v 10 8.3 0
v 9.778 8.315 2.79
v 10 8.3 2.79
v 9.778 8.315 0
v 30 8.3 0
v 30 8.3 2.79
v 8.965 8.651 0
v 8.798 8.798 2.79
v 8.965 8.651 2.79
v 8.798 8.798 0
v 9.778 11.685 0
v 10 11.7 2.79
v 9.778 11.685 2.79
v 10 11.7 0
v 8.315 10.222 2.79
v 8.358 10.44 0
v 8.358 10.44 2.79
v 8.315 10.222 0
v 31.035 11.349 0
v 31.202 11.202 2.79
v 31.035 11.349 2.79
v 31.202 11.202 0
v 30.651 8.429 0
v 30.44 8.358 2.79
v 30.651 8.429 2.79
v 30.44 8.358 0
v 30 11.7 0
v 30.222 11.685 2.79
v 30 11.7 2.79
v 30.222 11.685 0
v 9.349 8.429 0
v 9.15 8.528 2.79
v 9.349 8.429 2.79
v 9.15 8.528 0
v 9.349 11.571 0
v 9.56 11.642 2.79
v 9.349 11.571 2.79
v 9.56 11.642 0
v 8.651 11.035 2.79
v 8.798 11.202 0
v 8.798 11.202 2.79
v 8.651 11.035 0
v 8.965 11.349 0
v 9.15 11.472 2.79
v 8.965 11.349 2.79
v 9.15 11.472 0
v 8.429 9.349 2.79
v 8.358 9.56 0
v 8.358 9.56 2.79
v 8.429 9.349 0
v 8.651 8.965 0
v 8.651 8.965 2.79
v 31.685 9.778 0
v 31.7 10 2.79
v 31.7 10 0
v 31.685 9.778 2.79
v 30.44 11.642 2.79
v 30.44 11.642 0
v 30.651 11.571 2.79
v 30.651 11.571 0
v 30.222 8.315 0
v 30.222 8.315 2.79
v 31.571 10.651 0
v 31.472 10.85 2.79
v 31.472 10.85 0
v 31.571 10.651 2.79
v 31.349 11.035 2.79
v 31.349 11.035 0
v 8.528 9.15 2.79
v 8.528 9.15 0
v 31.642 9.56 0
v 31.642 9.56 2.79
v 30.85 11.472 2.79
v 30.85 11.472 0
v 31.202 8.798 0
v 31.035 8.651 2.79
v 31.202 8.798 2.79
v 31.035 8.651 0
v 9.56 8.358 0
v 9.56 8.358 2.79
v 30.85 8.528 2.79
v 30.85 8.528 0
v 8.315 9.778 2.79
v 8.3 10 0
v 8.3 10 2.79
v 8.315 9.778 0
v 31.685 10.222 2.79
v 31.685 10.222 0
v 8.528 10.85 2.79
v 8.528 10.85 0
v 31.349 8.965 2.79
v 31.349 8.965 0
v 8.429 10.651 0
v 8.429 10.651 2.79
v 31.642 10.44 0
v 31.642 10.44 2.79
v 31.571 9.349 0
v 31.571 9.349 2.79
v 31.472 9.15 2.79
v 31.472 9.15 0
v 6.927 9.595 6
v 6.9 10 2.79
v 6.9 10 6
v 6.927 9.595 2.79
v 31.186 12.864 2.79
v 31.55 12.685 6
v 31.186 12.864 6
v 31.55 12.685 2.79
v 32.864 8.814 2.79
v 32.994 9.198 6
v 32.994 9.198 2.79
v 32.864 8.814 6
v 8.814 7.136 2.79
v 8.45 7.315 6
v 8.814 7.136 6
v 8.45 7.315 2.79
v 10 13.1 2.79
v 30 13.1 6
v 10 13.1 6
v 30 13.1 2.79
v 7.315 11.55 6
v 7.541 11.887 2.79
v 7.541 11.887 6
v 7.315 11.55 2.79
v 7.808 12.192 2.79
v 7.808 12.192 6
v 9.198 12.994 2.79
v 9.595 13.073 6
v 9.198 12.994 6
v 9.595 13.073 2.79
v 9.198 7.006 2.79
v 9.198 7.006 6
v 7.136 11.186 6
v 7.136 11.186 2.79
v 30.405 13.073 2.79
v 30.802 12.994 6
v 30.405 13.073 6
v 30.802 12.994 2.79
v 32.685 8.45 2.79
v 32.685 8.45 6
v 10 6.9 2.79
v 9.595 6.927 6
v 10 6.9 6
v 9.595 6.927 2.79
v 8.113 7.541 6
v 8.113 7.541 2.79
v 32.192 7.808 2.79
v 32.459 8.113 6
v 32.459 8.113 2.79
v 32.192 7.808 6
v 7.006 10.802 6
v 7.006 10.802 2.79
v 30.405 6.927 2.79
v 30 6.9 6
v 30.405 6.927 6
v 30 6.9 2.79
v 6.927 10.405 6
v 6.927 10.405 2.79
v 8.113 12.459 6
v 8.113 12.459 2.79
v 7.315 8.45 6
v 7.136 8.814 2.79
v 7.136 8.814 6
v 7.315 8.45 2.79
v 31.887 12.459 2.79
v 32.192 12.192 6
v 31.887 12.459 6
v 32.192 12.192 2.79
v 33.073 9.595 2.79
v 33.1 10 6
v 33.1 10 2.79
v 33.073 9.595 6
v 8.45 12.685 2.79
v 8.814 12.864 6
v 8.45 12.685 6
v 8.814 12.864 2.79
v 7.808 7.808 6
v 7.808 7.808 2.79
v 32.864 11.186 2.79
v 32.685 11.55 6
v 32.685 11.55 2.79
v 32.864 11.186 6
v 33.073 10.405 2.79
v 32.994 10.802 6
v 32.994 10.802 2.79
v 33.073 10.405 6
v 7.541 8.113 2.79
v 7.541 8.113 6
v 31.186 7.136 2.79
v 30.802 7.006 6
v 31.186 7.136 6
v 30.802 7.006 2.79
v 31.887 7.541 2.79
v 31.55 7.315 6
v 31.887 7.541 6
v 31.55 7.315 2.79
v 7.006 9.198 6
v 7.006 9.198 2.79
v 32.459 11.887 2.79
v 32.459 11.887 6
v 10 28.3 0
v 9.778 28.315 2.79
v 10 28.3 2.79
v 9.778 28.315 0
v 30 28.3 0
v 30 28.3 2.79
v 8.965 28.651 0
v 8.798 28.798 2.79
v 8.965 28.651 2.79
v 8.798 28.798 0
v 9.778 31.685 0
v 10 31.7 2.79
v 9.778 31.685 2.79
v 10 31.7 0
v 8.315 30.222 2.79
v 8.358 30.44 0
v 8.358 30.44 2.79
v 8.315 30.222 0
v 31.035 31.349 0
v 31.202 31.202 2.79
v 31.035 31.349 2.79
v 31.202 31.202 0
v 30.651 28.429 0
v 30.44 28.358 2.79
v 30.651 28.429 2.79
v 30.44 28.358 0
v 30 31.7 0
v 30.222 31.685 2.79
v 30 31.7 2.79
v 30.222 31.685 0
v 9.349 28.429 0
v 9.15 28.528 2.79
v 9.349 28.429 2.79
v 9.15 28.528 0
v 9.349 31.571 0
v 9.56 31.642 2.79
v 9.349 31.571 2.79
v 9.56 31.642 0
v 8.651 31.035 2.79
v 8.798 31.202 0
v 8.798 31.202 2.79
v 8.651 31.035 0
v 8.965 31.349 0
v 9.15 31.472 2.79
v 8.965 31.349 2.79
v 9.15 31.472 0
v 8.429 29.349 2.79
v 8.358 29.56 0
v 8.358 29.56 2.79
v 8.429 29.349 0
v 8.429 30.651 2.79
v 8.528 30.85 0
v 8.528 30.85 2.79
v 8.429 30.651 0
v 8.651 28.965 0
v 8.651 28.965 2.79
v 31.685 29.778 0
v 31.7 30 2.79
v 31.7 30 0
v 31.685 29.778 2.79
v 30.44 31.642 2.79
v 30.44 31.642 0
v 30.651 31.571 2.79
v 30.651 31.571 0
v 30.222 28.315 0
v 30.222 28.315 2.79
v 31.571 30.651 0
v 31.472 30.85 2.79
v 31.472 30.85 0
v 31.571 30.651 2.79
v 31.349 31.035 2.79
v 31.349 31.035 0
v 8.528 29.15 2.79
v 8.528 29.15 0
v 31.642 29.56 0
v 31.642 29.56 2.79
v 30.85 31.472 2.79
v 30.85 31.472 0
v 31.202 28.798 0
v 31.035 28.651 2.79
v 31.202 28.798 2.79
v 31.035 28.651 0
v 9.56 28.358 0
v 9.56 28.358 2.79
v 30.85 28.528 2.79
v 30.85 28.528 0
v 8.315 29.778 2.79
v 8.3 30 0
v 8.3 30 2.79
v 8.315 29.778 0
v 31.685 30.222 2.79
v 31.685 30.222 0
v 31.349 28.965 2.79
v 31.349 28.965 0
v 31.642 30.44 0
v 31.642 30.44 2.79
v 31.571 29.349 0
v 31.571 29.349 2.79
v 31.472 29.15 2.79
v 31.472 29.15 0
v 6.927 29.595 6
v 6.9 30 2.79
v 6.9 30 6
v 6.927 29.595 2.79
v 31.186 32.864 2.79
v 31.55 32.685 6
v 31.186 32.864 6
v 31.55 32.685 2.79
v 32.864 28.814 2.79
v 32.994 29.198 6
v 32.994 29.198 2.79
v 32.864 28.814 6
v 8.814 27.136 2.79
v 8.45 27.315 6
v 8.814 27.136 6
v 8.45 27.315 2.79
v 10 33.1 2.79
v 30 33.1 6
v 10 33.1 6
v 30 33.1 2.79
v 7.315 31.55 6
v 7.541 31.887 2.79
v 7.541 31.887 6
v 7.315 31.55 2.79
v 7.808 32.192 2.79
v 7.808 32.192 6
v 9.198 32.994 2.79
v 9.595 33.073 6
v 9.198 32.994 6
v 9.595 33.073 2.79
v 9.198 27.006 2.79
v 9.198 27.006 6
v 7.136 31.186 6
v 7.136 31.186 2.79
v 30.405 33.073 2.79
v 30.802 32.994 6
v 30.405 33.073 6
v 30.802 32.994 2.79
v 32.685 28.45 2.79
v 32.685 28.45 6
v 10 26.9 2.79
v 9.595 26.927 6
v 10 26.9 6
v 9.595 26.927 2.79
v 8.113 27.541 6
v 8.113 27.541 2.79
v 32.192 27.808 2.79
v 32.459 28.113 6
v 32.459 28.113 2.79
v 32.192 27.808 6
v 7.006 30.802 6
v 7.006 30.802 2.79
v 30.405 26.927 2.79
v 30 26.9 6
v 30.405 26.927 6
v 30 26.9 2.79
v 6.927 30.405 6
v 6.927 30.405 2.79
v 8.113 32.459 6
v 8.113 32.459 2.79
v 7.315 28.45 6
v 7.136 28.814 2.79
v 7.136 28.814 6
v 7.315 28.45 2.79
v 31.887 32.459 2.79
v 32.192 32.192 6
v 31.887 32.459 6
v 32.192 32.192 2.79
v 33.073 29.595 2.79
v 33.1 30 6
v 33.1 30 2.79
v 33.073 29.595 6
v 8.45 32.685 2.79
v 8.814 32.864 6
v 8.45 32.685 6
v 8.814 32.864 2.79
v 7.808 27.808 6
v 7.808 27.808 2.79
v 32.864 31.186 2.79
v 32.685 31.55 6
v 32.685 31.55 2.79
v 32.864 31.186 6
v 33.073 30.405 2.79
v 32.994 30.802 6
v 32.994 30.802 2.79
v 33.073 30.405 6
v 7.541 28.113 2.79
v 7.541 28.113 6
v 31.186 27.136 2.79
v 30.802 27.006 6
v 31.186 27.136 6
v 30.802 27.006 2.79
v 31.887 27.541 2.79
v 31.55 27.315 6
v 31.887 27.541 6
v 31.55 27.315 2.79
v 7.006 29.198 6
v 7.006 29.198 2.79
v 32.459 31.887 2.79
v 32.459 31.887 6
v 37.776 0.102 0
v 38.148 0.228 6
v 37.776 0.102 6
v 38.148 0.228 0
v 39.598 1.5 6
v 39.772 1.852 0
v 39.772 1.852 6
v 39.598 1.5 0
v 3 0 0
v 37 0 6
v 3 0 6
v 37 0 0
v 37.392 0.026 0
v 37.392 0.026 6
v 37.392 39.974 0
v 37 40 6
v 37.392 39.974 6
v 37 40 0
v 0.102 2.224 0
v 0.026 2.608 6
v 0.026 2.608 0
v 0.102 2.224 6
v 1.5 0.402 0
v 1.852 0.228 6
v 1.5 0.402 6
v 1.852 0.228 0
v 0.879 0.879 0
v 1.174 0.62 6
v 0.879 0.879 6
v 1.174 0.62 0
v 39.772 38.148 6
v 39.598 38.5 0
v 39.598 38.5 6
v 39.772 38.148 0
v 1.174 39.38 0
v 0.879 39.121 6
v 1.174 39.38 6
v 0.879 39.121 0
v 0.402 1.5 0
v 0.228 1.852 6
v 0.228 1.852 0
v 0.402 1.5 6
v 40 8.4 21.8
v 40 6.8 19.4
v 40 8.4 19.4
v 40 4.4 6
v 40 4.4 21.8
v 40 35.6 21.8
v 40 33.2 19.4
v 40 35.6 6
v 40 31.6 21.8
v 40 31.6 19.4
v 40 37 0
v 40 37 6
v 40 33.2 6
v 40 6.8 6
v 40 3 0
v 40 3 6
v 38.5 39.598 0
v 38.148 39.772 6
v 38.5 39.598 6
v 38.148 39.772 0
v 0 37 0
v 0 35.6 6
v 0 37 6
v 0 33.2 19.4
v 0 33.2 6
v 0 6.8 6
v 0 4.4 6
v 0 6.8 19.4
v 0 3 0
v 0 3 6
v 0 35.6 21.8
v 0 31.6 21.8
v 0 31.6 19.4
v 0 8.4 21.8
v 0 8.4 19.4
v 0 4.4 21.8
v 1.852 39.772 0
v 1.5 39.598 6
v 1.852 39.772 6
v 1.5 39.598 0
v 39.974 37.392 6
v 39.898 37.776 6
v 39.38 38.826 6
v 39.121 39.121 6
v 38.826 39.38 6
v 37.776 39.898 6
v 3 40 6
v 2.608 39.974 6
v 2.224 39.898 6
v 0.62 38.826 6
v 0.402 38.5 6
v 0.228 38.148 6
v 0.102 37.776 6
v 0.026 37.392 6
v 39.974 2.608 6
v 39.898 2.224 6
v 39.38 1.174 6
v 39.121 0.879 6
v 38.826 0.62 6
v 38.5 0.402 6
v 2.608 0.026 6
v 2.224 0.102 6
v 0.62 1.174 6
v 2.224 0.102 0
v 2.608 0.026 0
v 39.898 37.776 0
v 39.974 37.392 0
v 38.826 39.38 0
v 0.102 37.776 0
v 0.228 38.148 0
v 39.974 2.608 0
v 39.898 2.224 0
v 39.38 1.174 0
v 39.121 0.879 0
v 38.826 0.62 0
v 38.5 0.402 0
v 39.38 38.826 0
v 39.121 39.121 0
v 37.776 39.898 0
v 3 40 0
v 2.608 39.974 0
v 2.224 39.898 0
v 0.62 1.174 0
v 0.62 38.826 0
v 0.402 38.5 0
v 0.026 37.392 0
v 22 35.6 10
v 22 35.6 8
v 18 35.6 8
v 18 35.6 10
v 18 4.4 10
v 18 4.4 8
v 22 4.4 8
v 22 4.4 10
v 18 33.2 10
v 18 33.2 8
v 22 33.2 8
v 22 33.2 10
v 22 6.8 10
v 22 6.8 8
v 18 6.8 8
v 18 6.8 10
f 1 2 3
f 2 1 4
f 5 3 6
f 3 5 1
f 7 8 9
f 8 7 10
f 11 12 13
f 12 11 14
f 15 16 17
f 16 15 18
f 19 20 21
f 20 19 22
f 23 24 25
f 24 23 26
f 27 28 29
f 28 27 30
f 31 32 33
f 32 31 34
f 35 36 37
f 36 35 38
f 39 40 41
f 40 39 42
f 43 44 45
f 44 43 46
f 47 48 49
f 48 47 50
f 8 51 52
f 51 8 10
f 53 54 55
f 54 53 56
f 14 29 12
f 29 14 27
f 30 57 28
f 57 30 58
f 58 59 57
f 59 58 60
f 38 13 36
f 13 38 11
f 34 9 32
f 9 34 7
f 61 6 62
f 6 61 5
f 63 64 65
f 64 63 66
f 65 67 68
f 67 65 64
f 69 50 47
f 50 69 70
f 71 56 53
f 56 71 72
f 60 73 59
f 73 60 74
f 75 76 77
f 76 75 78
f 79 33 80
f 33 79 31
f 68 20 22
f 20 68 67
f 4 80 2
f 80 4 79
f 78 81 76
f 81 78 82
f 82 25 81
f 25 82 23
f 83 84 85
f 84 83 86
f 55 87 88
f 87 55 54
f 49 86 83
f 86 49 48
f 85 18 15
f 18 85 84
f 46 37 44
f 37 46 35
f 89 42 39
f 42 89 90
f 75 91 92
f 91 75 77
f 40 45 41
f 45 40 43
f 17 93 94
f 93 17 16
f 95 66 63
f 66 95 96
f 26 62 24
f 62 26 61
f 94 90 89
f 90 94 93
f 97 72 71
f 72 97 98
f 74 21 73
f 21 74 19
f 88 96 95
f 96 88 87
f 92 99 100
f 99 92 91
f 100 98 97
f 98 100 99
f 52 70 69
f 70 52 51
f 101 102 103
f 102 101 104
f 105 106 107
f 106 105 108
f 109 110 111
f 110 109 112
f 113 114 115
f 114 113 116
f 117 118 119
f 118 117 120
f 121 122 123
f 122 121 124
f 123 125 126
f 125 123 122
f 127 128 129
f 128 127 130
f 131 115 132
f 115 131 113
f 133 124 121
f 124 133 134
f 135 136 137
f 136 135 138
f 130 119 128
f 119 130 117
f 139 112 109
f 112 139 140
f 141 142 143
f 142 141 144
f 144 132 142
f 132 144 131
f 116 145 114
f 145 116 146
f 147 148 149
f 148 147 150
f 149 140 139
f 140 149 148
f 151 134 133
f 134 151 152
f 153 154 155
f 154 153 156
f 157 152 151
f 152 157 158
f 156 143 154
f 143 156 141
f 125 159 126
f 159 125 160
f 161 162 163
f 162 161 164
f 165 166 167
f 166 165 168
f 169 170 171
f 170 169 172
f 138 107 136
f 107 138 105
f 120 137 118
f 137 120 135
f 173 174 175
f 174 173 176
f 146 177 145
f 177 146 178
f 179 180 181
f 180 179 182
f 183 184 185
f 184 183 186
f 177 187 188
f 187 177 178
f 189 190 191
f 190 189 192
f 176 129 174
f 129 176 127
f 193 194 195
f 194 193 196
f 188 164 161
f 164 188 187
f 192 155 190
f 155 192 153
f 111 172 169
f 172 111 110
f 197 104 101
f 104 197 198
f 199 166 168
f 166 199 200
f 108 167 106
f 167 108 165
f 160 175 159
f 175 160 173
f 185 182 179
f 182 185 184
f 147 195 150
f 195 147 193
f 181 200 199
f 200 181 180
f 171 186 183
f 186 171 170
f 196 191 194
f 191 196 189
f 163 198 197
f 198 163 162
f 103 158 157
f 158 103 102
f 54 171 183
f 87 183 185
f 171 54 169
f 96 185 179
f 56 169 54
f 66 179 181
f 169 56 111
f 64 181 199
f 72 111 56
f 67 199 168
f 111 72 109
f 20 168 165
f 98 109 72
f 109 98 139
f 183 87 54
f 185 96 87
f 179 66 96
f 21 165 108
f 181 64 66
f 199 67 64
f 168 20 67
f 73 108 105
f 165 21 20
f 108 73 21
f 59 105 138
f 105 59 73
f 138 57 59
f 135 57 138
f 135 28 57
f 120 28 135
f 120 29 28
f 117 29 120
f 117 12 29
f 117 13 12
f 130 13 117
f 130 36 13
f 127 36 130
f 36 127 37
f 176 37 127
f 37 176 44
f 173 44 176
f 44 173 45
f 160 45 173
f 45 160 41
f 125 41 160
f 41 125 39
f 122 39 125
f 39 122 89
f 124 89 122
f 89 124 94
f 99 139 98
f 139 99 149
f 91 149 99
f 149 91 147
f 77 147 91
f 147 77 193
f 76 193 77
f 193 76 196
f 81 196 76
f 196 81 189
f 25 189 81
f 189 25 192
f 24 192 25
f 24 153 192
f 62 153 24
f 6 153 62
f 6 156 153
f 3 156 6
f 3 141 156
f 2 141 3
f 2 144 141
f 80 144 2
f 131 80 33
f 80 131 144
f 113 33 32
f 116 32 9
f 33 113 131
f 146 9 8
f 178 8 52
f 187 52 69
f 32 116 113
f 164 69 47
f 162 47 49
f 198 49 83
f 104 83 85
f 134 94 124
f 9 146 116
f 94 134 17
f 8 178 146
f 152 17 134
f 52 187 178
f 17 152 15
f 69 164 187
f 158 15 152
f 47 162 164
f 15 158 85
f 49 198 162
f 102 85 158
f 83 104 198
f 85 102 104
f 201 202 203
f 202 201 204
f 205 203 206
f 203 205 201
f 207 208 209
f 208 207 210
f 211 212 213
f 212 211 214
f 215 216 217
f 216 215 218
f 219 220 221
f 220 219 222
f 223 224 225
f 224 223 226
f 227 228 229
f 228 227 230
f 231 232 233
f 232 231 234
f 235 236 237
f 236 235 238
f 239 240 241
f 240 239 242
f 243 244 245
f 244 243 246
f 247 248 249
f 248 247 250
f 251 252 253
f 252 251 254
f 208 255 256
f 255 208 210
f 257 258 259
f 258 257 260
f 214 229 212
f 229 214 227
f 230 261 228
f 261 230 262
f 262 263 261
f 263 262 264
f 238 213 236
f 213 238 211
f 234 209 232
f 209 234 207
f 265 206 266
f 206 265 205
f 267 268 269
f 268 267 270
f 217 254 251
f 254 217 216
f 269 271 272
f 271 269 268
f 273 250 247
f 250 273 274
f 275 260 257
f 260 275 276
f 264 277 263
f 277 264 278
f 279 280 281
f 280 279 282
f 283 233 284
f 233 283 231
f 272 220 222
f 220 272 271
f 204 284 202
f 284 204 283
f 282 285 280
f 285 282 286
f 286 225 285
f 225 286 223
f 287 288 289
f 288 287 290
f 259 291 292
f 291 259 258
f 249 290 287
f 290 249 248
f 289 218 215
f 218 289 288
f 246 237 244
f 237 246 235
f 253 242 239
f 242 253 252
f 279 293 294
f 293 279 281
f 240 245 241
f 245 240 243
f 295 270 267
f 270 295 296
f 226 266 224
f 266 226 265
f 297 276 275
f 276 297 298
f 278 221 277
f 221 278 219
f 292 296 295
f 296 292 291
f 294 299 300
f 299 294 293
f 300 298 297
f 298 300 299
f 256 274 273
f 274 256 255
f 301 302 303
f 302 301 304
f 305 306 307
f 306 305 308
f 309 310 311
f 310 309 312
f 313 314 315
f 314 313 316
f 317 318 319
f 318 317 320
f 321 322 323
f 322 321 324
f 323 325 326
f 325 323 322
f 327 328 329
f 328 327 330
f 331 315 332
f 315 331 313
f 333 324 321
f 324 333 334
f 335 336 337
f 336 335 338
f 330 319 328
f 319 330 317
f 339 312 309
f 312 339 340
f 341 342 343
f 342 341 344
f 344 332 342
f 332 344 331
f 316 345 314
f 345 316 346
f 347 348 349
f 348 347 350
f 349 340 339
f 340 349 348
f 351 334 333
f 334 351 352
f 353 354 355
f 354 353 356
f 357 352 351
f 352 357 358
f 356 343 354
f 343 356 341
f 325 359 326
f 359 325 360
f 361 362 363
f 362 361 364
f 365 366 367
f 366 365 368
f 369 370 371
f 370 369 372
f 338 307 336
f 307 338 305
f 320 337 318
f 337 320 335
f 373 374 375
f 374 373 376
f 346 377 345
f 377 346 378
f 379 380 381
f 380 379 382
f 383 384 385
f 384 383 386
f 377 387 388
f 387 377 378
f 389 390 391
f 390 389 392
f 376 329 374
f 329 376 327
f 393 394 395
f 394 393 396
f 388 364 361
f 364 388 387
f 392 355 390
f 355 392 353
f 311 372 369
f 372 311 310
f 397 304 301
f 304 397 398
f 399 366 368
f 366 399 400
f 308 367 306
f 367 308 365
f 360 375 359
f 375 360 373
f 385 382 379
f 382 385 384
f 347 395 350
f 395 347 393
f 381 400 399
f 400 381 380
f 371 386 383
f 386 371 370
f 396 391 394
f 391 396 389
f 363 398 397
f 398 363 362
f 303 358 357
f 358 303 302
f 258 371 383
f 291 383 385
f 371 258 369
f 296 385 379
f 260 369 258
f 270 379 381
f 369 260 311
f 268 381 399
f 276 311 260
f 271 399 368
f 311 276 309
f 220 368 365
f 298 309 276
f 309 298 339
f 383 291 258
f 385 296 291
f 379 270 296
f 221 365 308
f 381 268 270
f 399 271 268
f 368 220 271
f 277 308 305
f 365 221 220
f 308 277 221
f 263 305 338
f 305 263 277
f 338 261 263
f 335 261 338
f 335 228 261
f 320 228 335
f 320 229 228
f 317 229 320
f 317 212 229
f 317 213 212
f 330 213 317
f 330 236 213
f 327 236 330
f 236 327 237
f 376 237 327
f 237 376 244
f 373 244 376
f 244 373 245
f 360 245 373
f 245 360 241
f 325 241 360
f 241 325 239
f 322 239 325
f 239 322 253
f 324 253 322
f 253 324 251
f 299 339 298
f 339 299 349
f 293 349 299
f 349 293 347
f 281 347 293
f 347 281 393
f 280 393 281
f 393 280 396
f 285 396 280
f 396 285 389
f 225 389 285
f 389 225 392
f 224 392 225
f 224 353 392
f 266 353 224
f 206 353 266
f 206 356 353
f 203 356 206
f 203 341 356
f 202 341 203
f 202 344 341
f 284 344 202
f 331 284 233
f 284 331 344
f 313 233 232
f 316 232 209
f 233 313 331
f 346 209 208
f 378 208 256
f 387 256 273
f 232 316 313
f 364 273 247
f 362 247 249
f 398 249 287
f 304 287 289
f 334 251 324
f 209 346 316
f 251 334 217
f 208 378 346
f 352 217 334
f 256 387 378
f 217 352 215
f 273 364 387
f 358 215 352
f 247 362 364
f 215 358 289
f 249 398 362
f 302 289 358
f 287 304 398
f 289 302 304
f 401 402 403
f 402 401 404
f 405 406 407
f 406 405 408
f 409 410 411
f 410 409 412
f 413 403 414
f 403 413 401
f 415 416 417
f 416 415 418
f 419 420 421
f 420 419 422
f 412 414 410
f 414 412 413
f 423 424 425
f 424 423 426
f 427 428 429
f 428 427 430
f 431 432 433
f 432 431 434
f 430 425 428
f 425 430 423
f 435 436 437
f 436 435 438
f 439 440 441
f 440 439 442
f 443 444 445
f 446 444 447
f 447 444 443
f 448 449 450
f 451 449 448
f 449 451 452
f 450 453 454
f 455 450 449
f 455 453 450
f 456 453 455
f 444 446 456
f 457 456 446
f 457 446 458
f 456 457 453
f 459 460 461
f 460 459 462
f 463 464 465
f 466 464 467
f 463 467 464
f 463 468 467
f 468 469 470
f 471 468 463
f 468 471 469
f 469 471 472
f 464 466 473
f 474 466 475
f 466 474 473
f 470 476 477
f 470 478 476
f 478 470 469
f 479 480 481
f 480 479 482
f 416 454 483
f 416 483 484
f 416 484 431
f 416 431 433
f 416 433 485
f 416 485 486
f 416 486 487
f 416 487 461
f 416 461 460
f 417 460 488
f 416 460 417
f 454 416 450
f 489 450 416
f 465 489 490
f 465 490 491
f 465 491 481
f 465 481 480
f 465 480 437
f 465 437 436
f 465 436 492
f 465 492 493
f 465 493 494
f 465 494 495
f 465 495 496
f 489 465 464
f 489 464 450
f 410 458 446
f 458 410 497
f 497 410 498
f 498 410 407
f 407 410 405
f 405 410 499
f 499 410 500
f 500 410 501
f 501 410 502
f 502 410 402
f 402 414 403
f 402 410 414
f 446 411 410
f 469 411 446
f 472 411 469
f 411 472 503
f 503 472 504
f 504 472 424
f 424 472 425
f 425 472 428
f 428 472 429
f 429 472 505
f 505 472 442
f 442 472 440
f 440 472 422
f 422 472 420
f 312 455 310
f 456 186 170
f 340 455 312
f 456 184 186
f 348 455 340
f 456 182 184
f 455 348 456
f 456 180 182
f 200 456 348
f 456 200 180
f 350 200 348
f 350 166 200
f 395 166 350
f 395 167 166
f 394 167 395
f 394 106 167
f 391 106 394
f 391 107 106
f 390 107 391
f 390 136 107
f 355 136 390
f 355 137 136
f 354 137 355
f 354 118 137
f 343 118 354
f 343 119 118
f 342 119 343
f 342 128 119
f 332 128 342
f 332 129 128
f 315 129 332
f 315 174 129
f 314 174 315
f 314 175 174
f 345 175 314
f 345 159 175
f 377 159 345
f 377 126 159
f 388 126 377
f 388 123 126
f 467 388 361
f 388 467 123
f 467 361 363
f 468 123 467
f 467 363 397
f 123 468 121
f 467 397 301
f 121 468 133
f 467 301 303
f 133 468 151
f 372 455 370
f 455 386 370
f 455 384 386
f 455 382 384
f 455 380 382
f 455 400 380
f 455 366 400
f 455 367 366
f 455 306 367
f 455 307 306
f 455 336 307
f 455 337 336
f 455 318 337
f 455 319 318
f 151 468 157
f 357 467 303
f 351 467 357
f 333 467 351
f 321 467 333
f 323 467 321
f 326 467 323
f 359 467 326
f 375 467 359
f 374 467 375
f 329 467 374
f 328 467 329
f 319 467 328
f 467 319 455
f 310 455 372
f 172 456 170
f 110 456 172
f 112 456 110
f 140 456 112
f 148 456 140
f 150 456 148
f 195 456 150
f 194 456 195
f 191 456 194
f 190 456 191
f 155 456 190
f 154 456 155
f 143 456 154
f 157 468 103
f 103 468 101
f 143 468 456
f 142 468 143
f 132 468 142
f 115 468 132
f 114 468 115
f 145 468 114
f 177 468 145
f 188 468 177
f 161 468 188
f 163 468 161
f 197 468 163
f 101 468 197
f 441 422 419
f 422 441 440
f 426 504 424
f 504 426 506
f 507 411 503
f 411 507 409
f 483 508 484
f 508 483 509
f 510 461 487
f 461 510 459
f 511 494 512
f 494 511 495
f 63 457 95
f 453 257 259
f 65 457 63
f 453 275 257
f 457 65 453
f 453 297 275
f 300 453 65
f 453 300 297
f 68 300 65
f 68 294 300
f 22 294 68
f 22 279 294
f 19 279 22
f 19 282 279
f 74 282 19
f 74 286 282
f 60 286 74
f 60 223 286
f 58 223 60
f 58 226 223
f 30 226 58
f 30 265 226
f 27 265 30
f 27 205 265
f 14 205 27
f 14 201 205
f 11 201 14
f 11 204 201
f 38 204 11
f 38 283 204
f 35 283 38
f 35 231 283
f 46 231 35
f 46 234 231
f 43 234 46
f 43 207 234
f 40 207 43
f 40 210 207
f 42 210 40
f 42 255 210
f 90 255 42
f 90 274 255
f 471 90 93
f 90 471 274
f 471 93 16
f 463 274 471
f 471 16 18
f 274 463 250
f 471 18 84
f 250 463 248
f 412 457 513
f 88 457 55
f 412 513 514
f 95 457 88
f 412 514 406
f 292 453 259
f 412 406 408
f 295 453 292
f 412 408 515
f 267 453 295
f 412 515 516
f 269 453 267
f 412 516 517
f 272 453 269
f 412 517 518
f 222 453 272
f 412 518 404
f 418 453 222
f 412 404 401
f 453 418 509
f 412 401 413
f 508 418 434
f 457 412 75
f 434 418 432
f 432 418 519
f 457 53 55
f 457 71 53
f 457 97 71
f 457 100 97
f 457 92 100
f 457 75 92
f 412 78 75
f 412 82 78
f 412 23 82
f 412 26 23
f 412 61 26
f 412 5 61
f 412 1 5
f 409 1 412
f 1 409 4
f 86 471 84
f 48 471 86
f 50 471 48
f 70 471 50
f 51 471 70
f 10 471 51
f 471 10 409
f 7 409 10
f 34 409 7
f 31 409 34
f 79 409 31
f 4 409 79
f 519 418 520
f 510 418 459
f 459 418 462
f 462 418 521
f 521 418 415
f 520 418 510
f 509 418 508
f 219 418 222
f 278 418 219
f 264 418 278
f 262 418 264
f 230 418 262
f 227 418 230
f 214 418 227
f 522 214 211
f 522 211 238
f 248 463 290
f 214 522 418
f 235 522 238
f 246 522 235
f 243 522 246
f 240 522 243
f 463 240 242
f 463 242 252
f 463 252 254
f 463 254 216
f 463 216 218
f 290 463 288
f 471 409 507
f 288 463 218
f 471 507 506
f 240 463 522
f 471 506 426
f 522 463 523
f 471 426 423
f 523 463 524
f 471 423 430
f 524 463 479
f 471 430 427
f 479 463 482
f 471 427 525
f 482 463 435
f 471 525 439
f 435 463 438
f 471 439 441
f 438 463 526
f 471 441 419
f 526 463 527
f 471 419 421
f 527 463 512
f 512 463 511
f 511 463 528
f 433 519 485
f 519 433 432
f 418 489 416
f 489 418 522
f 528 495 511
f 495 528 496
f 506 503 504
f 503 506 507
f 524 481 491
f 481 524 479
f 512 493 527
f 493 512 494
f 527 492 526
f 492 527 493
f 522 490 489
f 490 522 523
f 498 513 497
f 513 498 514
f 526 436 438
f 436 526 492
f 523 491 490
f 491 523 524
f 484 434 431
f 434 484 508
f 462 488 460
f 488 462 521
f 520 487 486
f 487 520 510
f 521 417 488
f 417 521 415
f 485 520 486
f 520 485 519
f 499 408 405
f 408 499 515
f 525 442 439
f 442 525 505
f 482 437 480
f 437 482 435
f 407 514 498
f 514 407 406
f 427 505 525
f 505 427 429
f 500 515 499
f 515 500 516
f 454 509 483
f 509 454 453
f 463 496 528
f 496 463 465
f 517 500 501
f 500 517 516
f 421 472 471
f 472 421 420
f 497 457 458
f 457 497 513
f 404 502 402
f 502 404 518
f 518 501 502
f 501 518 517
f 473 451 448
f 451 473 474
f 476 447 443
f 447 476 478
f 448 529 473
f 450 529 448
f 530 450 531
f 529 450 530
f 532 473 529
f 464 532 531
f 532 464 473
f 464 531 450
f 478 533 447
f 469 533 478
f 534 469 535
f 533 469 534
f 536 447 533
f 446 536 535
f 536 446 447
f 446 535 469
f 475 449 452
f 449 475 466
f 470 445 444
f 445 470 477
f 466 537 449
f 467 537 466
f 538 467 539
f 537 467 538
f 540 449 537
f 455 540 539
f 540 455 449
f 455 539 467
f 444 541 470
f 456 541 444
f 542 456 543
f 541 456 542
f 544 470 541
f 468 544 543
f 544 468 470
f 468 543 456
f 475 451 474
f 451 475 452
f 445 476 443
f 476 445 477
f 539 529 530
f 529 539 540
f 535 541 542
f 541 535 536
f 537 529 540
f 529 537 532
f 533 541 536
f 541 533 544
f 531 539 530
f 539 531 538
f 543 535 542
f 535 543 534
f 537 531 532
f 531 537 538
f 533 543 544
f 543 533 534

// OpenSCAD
// file: bugout.scad
// bugout.scad - shared library for the Bugout SDR mounting system.
//
// Everything mounts on a 20 mm grid of M3 holes. Base tiles carry captive
// M3 nuts underneath, so any bracket with grid-spaced slots can be bolted
// anywhere on the floor with M3 x 8-12 mm screws.
//
// Include this from part files with:  include <bugout.scad>

$fn = 48;

// ---- Grid and hardware ---------------------------------------------------
PITCH      = 20;     // grid spacing, mm
M3_CLEAR   = 3.4;    // M3 clearance hole
M3_HEAD_D  = 6.2;    // M3 socket head counterbore
M3_HEAD_H  = 3.2;
M3_NUT_AF  = 5.7;    // M3 nut across flats, with print clearance
M3_NUT_H   = 2.6;
M3_INSERT  = 4.2;    // hole for M3 heat-set insert (if you prefer inserts)

// ---- Printing ------------------------------------------------------------
WALL   = 2.4;        // default wall, a multiple of a 0.4 nozzle
CHAMF  = 0.8;        // edge chamfer

// ---- Helpers -------------------------------------------------------------

// Hexagon prism for a nut trap, flats aligned with X.
module nut_trap(h = M3_NUT_H, af = M3_NUT_AF) {
    cylinder(d = af / cos(30), h = h, $fn = 6);
}

// Through hole for M3, optionally with counterbore at the top (z = h).
module m3_hole(h, counterbore = false) {
    translate([0, 0, -0.01]) cylinder(d = M3_CLEAR, h = h + 0.02);
    if (counterbore)
        translate([0, 0, h - M3_HEAD_H]) cylinder(d = M3_HEAD_D, h = M3_HEAD_H + 0.01);
}

// Slot of length len (centre to centre) along X, for M3.
module m3_slot(len, h, d = M3_CLEAR) {
    translate([0, 0, -0.01]) hull() {
        cylinder(d = d, h = h + 0.02);
        translate([len, 0, 0]) cylinder(d = d, h = h + 0.02);
    }
}

// Rounded rectangle plate, corner radius r, origin at the corner.
module rplate(w, d, h, r = 3) {
    r2 = min(r, w / 2 - 0.01, d / 2 - 0.01);
    translate([r2, r2, 0]) linear_extrude(h)
        offset(r = r2) square([w - 2 * r2, d - 2 * r2]);
}

// Grid of points, nx by ny, starting at (x0, y0).
module grid(nx, ny, x0 = 0, y0 = 0, p = PITCH) {
    for (i = [0 : nx - 1], j = [0 : ny - 1])
        translate([x0 + i * p, y0 + j * p, 0]) children();
}

// Mounting foot: a plate with M3 slots on the grid, so any part can be
// bolted down and slid up to one pitch along X. Footprint nx x ny cells.
// With counterbore = true the screw heads sit flush with the top (h >= 6),
// so a battery or dongle can sit directly on the foot.
module grid_foot(nx, ny, h = 4, counterbore = false) {
    difference() {
        rplate(nx * PITCH, ny * PITCH, h);
        for (j = [0 : ny - 1])
            translate([PITCH / 2, PITCH / 2 + j * PITCH, 0]) {
                m3_slot((nx - 1) * PITCH, h);
                if (counterbore)
                    translate([0, 0, h - M3_HEAD_H])
                        m3_slot((nx - 1) * PITCH, M3_HEAD_H, M3_HEAD_D);
            }
    }
}

// Velcro / strap slot through a wall, slot width sw, height sh.
module strap_slot(sw = 22, sh = 3, depth = 20) {
    translate([-sw / 2, -depth / 2, 0]) cube([sw, depth, sh]);
}
// main file
// dongle_clip.scad - snap clip for a USB dongle such as the RTL-SDR v4.
//
// A U-channel the dongle presses into, with a cable-tie slot as backup.
// Defaults fit the RTL-SDR Blog v4 (about 64 x 26 x 13 mm, metal body);
// measure yours and add 0.4 mm to width and height.
//
// Print as rendered, foot down. No supports.

include <bugout.scad>

DW  = 26.4;   // dongle width (Y)
DH  = 13.4;   // dongle height (Z)
LEN = 40;     // clip length along the dongle (X)
LIP = 1.6;    // how far the lips overhang the top edge
BASE_T = 6;

NX = ceil(LEN / PITCH);
NY = ceil((DW + 2 * WALL) / PITCH);
OD = DW + 2 * WALL;
Y0 = (NY * PITCH - OD) / 2;

difference() {
    union() {
        grid_foot(NX, NY, BASE_T, counterbore = true);
        translate([0, Y0, BASE_T]) difference() {
            cube([LEN, OD, DH + WALL]);
            translate([-1, WALL, -1]) cube([LEN + 2, DW, DH + 1]);
            // opening at the top, narrower than the dongle: it snaps in
            translate([-1, WALL + LIP, DH - 0.01]) cube([LEN + 2, DW - 2 * LIP, WALL + 1]);
        }
    }
    // cable-tie slot across the middle
    translate([LEN / 2 - 2, -1, BASE_T + 2]) cube([4, NY * PITCH + 2, 2]);
}
